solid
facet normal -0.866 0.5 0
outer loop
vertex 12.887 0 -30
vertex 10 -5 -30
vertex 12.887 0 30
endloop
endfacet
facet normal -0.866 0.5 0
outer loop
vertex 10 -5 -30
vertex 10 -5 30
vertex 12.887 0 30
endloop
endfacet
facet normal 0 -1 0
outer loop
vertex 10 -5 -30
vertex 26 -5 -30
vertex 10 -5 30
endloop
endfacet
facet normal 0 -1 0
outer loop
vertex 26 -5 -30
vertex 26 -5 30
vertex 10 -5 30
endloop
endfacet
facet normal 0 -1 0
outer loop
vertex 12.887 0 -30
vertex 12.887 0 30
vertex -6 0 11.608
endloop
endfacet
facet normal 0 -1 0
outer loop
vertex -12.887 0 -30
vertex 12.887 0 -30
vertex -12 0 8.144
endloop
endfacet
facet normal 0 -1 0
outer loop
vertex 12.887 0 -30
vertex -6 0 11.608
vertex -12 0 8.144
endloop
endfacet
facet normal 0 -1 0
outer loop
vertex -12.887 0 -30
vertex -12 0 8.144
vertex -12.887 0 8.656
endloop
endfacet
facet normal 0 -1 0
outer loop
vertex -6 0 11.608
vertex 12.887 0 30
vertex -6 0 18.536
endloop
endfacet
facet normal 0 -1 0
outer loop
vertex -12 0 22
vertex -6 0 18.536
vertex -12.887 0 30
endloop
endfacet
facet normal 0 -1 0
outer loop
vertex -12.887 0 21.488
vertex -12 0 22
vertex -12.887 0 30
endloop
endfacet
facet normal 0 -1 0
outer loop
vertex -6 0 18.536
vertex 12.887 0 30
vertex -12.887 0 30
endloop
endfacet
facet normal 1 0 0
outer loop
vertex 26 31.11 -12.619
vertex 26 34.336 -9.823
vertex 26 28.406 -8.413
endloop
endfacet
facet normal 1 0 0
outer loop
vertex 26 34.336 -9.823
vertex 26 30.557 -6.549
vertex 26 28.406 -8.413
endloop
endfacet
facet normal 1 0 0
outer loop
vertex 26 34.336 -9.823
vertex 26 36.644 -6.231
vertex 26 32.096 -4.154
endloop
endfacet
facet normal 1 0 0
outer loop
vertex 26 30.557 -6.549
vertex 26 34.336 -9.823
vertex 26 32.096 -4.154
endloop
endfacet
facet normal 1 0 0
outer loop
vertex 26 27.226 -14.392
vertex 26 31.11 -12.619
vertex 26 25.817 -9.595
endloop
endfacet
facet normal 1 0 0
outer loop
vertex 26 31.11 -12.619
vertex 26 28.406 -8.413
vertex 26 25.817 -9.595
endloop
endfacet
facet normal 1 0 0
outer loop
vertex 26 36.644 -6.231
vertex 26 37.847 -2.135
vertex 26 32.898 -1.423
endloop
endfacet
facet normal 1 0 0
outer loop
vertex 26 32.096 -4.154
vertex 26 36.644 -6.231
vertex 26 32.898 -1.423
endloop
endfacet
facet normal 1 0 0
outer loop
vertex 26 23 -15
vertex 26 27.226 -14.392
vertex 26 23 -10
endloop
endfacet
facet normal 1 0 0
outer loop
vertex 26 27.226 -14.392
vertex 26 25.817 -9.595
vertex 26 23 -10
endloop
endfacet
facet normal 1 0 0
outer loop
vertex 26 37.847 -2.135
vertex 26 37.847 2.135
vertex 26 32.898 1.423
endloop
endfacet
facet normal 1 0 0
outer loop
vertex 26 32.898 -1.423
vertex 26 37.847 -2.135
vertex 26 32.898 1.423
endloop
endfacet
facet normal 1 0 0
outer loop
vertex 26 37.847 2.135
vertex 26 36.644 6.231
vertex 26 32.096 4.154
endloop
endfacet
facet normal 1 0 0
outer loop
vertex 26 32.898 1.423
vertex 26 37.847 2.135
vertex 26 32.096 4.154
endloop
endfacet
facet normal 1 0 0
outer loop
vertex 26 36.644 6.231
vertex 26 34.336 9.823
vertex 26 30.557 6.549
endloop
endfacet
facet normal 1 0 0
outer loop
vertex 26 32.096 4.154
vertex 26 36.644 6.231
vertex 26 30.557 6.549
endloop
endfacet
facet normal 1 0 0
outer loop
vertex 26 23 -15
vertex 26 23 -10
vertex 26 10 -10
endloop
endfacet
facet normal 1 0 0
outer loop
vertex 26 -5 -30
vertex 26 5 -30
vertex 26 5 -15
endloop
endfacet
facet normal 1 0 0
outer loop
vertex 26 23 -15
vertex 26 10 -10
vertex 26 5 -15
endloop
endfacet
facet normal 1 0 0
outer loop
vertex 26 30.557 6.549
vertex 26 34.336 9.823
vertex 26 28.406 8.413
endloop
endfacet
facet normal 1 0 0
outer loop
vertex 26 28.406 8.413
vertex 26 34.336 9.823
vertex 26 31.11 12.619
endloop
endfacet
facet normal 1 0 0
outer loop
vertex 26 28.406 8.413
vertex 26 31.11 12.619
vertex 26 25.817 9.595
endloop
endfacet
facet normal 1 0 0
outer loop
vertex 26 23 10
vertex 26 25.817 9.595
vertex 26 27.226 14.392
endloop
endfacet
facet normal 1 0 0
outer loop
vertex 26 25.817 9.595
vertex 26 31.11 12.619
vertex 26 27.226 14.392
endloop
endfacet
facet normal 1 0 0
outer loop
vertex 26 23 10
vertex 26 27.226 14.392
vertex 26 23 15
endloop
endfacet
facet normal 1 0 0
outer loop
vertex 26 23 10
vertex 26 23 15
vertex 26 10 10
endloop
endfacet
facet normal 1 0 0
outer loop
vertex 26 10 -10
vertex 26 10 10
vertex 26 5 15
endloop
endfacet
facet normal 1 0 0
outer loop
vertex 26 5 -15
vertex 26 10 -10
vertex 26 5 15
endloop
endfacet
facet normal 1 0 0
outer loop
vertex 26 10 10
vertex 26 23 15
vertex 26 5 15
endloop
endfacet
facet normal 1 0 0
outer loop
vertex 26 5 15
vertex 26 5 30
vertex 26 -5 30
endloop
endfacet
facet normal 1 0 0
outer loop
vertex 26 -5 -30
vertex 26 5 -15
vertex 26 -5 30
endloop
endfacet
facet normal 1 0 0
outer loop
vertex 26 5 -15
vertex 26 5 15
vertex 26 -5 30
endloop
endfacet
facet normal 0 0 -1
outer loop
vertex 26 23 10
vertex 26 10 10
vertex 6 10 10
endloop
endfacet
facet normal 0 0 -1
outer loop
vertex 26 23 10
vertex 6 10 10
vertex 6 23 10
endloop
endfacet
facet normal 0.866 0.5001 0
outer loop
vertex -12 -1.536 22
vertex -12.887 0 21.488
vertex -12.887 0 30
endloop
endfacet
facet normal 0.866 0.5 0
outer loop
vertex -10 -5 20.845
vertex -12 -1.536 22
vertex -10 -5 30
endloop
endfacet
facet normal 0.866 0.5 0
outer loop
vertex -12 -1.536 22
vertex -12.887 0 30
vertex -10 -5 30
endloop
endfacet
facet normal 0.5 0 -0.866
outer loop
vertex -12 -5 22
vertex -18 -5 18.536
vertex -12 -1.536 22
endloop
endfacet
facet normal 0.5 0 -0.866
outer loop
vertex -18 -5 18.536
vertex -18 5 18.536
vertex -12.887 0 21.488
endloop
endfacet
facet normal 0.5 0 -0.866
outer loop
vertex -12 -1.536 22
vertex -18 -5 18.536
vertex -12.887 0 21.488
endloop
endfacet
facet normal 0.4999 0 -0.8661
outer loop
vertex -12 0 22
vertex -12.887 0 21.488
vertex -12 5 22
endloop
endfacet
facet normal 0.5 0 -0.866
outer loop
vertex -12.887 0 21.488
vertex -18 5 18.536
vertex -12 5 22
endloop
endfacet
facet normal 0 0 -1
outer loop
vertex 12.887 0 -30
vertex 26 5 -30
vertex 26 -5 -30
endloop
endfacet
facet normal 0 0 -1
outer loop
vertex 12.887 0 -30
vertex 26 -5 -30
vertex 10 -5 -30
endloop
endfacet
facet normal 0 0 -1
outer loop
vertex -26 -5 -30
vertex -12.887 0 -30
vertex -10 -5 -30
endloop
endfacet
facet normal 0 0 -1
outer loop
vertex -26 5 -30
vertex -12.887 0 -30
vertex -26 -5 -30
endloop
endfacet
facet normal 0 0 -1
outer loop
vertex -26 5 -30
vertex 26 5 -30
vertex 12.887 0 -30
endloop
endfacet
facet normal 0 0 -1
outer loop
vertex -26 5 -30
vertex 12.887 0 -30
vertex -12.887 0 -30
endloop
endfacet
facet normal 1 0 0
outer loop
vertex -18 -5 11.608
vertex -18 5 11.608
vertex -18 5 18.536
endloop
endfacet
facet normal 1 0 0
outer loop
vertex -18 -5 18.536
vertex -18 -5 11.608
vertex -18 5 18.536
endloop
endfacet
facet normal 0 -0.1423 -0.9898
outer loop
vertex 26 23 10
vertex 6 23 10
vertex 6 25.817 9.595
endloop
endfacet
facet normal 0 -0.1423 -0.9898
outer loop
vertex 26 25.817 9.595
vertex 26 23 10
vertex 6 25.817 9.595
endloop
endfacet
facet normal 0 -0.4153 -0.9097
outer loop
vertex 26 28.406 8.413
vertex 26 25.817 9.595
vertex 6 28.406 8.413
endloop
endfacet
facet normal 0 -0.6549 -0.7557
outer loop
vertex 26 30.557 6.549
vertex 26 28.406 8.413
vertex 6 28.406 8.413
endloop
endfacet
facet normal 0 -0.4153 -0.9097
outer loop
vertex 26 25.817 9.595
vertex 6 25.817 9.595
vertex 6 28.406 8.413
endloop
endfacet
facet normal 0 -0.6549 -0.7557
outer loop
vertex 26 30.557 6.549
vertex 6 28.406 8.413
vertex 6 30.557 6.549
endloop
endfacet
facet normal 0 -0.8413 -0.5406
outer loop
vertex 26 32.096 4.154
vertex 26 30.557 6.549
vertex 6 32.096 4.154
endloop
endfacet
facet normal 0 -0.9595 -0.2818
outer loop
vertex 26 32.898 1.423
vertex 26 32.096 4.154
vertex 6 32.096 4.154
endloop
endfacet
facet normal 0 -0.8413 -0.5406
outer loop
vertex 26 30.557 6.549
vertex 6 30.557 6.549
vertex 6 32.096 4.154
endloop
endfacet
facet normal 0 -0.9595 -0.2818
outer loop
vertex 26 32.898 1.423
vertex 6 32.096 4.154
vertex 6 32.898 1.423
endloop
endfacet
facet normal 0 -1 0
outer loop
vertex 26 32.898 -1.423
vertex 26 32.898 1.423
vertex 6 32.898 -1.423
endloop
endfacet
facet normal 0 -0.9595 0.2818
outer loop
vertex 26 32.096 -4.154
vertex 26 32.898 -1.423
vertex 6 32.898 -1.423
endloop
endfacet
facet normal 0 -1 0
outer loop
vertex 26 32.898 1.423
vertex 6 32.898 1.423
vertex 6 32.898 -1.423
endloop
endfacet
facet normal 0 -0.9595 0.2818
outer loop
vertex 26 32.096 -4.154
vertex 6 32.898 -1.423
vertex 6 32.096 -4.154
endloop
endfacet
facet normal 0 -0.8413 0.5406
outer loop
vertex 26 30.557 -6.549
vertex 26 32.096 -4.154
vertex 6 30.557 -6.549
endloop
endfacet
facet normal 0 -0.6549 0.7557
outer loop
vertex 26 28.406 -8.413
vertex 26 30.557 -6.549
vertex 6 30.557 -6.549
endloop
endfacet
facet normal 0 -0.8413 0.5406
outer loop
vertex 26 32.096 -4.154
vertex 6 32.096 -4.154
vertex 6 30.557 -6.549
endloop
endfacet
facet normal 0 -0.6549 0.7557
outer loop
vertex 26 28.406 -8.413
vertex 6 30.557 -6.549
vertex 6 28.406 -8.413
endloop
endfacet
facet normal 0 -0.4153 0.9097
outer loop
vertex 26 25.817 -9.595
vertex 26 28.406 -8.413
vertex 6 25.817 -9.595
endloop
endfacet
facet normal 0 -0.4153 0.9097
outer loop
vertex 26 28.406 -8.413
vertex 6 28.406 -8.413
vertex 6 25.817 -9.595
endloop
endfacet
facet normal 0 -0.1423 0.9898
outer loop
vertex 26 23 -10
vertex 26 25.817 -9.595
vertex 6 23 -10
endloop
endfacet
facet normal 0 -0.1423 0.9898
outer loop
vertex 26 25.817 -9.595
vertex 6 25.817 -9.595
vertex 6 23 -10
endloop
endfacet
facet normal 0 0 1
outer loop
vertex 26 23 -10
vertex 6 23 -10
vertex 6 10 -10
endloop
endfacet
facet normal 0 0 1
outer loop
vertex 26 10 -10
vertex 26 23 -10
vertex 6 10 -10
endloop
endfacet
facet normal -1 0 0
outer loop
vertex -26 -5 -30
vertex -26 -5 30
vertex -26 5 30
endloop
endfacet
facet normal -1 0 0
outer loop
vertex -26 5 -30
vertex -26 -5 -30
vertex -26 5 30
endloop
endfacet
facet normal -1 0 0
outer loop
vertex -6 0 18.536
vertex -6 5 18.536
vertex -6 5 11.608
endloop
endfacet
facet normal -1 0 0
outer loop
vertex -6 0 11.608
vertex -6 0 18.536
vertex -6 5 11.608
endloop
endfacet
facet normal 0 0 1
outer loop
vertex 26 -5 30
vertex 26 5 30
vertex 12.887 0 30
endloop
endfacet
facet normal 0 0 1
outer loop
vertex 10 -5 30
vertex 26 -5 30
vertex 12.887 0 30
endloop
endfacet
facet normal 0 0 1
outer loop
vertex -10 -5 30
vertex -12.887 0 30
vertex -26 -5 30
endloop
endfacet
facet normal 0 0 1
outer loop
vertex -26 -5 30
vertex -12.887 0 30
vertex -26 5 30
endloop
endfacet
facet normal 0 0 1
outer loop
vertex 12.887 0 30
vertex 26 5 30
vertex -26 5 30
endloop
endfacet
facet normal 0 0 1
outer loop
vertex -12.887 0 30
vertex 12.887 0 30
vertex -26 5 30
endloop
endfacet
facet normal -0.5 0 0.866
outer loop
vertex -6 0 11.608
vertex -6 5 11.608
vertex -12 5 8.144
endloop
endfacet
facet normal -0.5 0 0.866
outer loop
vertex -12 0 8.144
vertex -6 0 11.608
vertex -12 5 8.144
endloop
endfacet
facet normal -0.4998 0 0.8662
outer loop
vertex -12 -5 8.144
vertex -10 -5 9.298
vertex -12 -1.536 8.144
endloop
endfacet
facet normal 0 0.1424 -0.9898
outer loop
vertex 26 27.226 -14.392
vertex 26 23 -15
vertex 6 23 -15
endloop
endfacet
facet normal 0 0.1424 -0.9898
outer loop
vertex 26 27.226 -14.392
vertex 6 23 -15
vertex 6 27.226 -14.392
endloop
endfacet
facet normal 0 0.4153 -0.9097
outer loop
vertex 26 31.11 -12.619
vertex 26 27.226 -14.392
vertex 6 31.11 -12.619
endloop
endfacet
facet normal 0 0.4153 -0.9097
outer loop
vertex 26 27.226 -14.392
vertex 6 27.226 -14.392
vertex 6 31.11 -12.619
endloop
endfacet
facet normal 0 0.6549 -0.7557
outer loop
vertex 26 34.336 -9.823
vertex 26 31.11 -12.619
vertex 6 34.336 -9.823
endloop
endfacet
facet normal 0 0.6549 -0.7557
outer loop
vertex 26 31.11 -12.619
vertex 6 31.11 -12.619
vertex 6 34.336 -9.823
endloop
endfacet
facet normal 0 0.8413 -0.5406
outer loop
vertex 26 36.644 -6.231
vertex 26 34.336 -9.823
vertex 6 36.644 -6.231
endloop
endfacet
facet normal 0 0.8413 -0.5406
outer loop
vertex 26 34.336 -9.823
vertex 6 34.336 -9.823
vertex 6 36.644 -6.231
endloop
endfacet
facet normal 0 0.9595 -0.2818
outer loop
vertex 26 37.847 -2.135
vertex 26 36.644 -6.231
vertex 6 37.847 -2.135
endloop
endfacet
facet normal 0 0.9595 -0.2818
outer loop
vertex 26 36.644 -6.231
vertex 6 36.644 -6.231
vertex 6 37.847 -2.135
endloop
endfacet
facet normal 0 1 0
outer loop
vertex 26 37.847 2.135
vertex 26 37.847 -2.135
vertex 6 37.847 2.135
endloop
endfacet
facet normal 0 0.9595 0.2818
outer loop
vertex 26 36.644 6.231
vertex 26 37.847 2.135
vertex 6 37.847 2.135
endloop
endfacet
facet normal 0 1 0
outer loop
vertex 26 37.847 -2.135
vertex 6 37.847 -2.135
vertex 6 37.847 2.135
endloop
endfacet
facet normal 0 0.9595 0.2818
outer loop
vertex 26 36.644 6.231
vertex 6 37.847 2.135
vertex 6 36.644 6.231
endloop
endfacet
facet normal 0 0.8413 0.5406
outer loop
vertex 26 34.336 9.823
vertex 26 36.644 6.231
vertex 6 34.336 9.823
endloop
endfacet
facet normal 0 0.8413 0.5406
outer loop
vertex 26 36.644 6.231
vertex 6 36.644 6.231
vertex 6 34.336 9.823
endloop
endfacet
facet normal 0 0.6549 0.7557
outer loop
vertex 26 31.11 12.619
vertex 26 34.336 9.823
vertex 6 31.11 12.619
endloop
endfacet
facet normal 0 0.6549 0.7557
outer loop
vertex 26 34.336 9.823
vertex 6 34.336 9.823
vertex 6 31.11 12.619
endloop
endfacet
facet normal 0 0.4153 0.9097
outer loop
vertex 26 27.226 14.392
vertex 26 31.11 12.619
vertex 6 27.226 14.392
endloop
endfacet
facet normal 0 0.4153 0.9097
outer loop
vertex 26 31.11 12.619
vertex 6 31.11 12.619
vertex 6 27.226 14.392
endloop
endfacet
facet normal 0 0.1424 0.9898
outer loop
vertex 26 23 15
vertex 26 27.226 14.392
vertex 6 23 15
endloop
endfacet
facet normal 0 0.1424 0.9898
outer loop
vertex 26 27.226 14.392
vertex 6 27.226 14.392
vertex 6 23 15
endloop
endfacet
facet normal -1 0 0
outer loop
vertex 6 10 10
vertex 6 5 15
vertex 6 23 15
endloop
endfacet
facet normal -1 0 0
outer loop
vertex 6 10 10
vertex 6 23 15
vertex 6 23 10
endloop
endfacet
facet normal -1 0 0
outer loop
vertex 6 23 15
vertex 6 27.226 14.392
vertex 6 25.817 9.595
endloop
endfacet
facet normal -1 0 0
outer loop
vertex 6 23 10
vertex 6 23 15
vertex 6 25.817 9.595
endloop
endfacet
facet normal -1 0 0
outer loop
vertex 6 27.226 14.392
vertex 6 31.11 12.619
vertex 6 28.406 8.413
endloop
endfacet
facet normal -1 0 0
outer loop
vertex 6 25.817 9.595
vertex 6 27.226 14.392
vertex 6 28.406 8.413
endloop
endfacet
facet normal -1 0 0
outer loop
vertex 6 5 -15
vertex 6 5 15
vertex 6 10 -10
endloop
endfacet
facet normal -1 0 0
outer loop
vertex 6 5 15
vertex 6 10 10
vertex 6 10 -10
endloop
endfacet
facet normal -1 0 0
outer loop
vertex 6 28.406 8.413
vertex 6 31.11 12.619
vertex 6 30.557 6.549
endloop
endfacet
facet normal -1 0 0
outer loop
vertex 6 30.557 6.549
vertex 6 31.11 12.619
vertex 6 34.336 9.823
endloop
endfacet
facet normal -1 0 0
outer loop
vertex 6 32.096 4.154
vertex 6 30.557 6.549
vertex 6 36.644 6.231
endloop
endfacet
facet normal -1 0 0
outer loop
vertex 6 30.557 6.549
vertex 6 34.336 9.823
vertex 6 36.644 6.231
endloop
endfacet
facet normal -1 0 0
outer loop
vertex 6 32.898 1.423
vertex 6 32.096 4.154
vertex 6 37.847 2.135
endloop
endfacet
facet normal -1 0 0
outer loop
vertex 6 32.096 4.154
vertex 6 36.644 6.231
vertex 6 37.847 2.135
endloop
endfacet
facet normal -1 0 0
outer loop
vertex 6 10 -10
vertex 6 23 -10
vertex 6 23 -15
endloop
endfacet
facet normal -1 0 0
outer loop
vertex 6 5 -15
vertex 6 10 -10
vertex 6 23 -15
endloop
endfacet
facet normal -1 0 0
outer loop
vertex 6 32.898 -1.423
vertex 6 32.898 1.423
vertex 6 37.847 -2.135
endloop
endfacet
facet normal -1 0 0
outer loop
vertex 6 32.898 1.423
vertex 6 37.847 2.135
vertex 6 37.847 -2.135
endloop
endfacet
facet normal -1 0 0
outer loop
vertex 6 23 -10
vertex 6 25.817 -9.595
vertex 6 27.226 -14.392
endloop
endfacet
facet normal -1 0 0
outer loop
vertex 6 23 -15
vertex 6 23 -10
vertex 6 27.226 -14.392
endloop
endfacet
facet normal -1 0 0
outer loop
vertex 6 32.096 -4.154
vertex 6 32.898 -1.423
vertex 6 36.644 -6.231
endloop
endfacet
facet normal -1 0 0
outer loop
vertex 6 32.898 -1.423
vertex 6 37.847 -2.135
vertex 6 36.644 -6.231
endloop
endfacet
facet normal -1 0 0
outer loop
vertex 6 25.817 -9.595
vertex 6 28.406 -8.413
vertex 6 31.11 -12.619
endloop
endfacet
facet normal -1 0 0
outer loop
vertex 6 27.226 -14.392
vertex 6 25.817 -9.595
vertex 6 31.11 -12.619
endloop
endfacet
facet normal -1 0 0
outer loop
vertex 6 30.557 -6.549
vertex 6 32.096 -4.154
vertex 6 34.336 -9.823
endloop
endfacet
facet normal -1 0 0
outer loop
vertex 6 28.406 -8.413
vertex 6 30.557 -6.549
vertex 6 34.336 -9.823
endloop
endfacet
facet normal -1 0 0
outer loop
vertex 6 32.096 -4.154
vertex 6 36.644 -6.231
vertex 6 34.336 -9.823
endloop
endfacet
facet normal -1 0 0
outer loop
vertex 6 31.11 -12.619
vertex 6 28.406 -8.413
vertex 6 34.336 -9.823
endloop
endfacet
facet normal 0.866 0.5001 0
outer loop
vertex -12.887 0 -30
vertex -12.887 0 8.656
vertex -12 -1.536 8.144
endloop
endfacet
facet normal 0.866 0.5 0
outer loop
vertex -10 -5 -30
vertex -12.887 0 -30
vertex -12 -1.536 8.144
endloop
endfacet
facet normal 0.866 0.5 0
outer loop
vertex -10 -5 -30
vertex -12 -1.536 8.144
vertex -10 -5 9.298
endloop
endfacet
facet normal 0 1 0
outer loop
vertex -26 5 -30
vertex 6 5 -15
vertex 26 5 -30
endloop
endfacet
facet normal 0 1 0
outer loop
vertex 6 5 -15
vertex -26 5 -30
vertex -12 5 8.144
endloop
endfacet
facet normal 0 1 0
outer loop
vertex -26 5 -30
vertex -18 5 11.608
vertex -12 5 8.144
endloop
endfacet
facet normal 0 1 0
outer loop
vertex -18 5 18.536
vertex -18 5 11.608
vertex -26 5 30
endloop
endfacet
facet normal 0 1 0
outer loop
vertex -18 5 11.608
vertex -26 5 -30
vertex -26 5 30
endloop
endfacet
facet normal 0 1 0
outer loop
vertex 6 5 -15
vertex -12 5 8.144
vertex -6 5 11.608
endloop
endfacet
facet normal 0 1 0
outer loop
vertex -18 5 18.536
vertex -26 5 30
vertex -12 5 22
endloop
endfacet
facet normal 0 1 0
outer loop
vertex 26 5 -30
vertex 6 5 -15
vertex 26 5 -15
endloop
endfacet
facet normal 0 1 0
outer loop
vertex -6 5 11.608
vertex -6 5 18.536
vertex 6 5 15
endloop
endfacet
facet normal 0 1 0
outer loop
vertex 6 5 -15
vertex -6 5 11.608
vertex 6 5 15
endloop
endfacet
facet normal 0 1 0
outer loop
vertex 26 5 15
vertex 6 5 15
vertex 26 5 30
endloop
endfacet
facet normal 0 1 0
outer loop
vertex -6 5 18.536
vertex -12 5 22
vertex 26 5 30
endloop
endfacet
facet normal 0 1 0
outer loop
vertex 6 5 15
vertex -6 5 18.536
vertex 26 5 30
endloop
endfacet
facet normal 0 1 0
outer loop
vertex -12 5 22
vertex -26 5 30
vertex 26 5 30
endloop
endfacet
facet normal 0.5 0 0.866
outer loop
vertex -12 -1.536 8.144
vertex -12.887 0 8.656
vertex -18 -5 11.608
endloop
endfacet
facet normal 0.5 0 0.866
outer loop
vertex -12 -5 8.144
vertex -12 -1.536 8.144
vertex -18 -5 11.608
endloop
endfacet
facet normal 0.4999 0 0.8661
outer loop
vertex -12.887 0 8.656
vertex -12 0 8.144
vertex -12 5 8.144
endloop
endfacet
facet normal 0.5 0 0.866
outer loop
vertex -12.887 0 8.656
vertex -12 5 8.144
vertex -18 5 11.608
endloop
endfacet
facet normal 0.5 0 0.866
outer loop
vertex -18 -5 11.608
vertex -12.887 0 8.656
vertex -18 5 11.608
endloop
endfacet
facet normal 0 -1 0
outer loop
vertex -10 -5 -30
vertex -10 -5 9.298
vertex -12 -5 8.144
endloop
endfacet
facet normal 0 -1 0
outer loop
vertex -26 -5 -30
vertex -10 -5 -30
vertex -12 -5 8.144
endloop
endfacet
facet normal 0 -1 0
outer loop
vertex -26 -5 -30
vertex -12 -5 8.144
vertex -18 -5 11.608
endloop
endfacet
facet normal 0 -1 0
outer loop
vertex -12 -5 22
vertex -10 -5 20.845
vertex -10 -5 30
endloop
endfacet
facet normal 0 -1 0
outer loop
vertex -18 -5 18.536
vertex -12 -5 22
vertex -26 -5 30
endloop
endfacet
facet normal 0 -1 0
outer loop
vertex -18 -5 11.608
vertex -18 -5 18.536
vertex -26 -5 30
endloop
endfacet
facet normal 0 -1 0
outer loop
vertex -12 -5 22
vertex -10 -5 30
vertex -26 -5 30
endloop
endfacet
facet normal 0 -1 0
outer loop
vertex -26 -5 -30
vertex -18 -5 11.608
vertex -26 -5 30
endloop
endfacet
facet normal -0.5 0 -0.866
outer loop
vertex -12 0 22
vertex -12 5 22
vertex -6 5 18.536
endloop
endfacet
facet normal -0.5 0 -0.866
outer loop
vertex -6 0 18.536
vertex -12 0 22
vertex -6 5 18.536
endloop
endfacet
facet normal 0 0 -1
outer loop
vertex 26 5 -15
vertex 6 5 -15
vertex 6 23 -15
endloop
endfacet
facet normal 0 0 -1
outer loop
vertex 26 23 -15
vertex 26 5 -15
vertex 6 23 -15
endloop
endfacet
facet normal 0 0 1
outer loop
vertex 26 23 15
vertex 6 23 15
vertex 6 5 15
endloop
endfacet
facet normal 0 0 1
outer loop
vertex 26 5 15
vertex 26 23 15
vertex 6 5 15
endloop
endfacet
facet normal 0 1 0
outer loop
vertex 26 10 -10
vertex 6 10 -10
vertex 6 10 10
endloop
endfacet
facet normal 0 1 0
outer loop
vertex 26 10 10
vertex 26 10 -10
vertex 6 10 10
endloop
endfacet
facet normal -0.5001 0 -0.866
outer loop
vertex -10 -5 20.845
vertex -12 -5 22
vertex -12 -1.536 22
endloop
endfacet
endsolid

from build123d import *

# Parameters (mm, degrees)
EXTRUDE_2_DEPTH     = 30
EXTRUDE_START       = -20
EXTRUDE_1_DEPTH     = 20
CUT_EXTRUDE_1_REACH = 53.624


# Read off the part's stored shape, not the designer's step: 拉伸-薄壁1
with BuildPart() as part:
    # 草图1 → 凸台-拉伸2 (new, symmetric)
    with BuildSketch(Plane.XY):
        Polygon((-26, 5), (26, 5), (26, -5), (10, -5), (12.886751346, 0), (-12.886751346, 0), (-10, -5), (-26, -5), align=None)
    extrude(amount=EXTRUDE_2_DEPTH, both=True)

    # 拉伸-薄壁1 outline → 拉伸-薄壁1 (add)
    with BuildSketch(Plane(origin=(26, 0, 0), x_dir=(0, 0, -1), z_dir=(1, 0, 0)).offset(EXTRUDE_START)):
        with BuildLine():
            Line((15, 5), (15, 23))
            ThreePointArc((15, 23), (0, 38), (-15, 23))
            Line((-15, 23), (-15, 5))
            Line((-15, 5), (15, 5))
        make_face()
        with BuildLine():
            ThreePointArc((-10, 23), (0, 33), (10, 23))
            Line((10, 23), (10, 10))
            Line((10, 10), (-10, 10))
            Line((-10, 10), (-10, 23))
        make_face(mode=Mode.SUBTRACT)
    extrude(amount=EXTRUDE_1_DEPTH)

    # 草图6 → 切除-拉伸1 (cut, up to next)
    with BuildSketch(Plane(origin=(0, 5, 0), x_dir=(1, 0, 0), z_dir=(0, 1, 0)), mode=Mode.PRIVATE) as cut_extrude_1_sk1:
        Polygon((-6, -11.607695155), (-12, -8.143593539), (-18, -11.607695155), (-18, -18.535898385), (-12, -22), (-6, -18.535898385), align=None)
    cut_extrude_1_tool1 = extrude(cut_extrude_1_sk1.sketch, amount=-CUT_EXTRUDE_1_REACH, mode=Mode.PRIVATE) & part.part
    add(cut_extrude_1_tool1.solids().sort_by_distance((-12, 5, 15.071797))[0], mode=Mode.SUBTRACT)


solid = part.part
